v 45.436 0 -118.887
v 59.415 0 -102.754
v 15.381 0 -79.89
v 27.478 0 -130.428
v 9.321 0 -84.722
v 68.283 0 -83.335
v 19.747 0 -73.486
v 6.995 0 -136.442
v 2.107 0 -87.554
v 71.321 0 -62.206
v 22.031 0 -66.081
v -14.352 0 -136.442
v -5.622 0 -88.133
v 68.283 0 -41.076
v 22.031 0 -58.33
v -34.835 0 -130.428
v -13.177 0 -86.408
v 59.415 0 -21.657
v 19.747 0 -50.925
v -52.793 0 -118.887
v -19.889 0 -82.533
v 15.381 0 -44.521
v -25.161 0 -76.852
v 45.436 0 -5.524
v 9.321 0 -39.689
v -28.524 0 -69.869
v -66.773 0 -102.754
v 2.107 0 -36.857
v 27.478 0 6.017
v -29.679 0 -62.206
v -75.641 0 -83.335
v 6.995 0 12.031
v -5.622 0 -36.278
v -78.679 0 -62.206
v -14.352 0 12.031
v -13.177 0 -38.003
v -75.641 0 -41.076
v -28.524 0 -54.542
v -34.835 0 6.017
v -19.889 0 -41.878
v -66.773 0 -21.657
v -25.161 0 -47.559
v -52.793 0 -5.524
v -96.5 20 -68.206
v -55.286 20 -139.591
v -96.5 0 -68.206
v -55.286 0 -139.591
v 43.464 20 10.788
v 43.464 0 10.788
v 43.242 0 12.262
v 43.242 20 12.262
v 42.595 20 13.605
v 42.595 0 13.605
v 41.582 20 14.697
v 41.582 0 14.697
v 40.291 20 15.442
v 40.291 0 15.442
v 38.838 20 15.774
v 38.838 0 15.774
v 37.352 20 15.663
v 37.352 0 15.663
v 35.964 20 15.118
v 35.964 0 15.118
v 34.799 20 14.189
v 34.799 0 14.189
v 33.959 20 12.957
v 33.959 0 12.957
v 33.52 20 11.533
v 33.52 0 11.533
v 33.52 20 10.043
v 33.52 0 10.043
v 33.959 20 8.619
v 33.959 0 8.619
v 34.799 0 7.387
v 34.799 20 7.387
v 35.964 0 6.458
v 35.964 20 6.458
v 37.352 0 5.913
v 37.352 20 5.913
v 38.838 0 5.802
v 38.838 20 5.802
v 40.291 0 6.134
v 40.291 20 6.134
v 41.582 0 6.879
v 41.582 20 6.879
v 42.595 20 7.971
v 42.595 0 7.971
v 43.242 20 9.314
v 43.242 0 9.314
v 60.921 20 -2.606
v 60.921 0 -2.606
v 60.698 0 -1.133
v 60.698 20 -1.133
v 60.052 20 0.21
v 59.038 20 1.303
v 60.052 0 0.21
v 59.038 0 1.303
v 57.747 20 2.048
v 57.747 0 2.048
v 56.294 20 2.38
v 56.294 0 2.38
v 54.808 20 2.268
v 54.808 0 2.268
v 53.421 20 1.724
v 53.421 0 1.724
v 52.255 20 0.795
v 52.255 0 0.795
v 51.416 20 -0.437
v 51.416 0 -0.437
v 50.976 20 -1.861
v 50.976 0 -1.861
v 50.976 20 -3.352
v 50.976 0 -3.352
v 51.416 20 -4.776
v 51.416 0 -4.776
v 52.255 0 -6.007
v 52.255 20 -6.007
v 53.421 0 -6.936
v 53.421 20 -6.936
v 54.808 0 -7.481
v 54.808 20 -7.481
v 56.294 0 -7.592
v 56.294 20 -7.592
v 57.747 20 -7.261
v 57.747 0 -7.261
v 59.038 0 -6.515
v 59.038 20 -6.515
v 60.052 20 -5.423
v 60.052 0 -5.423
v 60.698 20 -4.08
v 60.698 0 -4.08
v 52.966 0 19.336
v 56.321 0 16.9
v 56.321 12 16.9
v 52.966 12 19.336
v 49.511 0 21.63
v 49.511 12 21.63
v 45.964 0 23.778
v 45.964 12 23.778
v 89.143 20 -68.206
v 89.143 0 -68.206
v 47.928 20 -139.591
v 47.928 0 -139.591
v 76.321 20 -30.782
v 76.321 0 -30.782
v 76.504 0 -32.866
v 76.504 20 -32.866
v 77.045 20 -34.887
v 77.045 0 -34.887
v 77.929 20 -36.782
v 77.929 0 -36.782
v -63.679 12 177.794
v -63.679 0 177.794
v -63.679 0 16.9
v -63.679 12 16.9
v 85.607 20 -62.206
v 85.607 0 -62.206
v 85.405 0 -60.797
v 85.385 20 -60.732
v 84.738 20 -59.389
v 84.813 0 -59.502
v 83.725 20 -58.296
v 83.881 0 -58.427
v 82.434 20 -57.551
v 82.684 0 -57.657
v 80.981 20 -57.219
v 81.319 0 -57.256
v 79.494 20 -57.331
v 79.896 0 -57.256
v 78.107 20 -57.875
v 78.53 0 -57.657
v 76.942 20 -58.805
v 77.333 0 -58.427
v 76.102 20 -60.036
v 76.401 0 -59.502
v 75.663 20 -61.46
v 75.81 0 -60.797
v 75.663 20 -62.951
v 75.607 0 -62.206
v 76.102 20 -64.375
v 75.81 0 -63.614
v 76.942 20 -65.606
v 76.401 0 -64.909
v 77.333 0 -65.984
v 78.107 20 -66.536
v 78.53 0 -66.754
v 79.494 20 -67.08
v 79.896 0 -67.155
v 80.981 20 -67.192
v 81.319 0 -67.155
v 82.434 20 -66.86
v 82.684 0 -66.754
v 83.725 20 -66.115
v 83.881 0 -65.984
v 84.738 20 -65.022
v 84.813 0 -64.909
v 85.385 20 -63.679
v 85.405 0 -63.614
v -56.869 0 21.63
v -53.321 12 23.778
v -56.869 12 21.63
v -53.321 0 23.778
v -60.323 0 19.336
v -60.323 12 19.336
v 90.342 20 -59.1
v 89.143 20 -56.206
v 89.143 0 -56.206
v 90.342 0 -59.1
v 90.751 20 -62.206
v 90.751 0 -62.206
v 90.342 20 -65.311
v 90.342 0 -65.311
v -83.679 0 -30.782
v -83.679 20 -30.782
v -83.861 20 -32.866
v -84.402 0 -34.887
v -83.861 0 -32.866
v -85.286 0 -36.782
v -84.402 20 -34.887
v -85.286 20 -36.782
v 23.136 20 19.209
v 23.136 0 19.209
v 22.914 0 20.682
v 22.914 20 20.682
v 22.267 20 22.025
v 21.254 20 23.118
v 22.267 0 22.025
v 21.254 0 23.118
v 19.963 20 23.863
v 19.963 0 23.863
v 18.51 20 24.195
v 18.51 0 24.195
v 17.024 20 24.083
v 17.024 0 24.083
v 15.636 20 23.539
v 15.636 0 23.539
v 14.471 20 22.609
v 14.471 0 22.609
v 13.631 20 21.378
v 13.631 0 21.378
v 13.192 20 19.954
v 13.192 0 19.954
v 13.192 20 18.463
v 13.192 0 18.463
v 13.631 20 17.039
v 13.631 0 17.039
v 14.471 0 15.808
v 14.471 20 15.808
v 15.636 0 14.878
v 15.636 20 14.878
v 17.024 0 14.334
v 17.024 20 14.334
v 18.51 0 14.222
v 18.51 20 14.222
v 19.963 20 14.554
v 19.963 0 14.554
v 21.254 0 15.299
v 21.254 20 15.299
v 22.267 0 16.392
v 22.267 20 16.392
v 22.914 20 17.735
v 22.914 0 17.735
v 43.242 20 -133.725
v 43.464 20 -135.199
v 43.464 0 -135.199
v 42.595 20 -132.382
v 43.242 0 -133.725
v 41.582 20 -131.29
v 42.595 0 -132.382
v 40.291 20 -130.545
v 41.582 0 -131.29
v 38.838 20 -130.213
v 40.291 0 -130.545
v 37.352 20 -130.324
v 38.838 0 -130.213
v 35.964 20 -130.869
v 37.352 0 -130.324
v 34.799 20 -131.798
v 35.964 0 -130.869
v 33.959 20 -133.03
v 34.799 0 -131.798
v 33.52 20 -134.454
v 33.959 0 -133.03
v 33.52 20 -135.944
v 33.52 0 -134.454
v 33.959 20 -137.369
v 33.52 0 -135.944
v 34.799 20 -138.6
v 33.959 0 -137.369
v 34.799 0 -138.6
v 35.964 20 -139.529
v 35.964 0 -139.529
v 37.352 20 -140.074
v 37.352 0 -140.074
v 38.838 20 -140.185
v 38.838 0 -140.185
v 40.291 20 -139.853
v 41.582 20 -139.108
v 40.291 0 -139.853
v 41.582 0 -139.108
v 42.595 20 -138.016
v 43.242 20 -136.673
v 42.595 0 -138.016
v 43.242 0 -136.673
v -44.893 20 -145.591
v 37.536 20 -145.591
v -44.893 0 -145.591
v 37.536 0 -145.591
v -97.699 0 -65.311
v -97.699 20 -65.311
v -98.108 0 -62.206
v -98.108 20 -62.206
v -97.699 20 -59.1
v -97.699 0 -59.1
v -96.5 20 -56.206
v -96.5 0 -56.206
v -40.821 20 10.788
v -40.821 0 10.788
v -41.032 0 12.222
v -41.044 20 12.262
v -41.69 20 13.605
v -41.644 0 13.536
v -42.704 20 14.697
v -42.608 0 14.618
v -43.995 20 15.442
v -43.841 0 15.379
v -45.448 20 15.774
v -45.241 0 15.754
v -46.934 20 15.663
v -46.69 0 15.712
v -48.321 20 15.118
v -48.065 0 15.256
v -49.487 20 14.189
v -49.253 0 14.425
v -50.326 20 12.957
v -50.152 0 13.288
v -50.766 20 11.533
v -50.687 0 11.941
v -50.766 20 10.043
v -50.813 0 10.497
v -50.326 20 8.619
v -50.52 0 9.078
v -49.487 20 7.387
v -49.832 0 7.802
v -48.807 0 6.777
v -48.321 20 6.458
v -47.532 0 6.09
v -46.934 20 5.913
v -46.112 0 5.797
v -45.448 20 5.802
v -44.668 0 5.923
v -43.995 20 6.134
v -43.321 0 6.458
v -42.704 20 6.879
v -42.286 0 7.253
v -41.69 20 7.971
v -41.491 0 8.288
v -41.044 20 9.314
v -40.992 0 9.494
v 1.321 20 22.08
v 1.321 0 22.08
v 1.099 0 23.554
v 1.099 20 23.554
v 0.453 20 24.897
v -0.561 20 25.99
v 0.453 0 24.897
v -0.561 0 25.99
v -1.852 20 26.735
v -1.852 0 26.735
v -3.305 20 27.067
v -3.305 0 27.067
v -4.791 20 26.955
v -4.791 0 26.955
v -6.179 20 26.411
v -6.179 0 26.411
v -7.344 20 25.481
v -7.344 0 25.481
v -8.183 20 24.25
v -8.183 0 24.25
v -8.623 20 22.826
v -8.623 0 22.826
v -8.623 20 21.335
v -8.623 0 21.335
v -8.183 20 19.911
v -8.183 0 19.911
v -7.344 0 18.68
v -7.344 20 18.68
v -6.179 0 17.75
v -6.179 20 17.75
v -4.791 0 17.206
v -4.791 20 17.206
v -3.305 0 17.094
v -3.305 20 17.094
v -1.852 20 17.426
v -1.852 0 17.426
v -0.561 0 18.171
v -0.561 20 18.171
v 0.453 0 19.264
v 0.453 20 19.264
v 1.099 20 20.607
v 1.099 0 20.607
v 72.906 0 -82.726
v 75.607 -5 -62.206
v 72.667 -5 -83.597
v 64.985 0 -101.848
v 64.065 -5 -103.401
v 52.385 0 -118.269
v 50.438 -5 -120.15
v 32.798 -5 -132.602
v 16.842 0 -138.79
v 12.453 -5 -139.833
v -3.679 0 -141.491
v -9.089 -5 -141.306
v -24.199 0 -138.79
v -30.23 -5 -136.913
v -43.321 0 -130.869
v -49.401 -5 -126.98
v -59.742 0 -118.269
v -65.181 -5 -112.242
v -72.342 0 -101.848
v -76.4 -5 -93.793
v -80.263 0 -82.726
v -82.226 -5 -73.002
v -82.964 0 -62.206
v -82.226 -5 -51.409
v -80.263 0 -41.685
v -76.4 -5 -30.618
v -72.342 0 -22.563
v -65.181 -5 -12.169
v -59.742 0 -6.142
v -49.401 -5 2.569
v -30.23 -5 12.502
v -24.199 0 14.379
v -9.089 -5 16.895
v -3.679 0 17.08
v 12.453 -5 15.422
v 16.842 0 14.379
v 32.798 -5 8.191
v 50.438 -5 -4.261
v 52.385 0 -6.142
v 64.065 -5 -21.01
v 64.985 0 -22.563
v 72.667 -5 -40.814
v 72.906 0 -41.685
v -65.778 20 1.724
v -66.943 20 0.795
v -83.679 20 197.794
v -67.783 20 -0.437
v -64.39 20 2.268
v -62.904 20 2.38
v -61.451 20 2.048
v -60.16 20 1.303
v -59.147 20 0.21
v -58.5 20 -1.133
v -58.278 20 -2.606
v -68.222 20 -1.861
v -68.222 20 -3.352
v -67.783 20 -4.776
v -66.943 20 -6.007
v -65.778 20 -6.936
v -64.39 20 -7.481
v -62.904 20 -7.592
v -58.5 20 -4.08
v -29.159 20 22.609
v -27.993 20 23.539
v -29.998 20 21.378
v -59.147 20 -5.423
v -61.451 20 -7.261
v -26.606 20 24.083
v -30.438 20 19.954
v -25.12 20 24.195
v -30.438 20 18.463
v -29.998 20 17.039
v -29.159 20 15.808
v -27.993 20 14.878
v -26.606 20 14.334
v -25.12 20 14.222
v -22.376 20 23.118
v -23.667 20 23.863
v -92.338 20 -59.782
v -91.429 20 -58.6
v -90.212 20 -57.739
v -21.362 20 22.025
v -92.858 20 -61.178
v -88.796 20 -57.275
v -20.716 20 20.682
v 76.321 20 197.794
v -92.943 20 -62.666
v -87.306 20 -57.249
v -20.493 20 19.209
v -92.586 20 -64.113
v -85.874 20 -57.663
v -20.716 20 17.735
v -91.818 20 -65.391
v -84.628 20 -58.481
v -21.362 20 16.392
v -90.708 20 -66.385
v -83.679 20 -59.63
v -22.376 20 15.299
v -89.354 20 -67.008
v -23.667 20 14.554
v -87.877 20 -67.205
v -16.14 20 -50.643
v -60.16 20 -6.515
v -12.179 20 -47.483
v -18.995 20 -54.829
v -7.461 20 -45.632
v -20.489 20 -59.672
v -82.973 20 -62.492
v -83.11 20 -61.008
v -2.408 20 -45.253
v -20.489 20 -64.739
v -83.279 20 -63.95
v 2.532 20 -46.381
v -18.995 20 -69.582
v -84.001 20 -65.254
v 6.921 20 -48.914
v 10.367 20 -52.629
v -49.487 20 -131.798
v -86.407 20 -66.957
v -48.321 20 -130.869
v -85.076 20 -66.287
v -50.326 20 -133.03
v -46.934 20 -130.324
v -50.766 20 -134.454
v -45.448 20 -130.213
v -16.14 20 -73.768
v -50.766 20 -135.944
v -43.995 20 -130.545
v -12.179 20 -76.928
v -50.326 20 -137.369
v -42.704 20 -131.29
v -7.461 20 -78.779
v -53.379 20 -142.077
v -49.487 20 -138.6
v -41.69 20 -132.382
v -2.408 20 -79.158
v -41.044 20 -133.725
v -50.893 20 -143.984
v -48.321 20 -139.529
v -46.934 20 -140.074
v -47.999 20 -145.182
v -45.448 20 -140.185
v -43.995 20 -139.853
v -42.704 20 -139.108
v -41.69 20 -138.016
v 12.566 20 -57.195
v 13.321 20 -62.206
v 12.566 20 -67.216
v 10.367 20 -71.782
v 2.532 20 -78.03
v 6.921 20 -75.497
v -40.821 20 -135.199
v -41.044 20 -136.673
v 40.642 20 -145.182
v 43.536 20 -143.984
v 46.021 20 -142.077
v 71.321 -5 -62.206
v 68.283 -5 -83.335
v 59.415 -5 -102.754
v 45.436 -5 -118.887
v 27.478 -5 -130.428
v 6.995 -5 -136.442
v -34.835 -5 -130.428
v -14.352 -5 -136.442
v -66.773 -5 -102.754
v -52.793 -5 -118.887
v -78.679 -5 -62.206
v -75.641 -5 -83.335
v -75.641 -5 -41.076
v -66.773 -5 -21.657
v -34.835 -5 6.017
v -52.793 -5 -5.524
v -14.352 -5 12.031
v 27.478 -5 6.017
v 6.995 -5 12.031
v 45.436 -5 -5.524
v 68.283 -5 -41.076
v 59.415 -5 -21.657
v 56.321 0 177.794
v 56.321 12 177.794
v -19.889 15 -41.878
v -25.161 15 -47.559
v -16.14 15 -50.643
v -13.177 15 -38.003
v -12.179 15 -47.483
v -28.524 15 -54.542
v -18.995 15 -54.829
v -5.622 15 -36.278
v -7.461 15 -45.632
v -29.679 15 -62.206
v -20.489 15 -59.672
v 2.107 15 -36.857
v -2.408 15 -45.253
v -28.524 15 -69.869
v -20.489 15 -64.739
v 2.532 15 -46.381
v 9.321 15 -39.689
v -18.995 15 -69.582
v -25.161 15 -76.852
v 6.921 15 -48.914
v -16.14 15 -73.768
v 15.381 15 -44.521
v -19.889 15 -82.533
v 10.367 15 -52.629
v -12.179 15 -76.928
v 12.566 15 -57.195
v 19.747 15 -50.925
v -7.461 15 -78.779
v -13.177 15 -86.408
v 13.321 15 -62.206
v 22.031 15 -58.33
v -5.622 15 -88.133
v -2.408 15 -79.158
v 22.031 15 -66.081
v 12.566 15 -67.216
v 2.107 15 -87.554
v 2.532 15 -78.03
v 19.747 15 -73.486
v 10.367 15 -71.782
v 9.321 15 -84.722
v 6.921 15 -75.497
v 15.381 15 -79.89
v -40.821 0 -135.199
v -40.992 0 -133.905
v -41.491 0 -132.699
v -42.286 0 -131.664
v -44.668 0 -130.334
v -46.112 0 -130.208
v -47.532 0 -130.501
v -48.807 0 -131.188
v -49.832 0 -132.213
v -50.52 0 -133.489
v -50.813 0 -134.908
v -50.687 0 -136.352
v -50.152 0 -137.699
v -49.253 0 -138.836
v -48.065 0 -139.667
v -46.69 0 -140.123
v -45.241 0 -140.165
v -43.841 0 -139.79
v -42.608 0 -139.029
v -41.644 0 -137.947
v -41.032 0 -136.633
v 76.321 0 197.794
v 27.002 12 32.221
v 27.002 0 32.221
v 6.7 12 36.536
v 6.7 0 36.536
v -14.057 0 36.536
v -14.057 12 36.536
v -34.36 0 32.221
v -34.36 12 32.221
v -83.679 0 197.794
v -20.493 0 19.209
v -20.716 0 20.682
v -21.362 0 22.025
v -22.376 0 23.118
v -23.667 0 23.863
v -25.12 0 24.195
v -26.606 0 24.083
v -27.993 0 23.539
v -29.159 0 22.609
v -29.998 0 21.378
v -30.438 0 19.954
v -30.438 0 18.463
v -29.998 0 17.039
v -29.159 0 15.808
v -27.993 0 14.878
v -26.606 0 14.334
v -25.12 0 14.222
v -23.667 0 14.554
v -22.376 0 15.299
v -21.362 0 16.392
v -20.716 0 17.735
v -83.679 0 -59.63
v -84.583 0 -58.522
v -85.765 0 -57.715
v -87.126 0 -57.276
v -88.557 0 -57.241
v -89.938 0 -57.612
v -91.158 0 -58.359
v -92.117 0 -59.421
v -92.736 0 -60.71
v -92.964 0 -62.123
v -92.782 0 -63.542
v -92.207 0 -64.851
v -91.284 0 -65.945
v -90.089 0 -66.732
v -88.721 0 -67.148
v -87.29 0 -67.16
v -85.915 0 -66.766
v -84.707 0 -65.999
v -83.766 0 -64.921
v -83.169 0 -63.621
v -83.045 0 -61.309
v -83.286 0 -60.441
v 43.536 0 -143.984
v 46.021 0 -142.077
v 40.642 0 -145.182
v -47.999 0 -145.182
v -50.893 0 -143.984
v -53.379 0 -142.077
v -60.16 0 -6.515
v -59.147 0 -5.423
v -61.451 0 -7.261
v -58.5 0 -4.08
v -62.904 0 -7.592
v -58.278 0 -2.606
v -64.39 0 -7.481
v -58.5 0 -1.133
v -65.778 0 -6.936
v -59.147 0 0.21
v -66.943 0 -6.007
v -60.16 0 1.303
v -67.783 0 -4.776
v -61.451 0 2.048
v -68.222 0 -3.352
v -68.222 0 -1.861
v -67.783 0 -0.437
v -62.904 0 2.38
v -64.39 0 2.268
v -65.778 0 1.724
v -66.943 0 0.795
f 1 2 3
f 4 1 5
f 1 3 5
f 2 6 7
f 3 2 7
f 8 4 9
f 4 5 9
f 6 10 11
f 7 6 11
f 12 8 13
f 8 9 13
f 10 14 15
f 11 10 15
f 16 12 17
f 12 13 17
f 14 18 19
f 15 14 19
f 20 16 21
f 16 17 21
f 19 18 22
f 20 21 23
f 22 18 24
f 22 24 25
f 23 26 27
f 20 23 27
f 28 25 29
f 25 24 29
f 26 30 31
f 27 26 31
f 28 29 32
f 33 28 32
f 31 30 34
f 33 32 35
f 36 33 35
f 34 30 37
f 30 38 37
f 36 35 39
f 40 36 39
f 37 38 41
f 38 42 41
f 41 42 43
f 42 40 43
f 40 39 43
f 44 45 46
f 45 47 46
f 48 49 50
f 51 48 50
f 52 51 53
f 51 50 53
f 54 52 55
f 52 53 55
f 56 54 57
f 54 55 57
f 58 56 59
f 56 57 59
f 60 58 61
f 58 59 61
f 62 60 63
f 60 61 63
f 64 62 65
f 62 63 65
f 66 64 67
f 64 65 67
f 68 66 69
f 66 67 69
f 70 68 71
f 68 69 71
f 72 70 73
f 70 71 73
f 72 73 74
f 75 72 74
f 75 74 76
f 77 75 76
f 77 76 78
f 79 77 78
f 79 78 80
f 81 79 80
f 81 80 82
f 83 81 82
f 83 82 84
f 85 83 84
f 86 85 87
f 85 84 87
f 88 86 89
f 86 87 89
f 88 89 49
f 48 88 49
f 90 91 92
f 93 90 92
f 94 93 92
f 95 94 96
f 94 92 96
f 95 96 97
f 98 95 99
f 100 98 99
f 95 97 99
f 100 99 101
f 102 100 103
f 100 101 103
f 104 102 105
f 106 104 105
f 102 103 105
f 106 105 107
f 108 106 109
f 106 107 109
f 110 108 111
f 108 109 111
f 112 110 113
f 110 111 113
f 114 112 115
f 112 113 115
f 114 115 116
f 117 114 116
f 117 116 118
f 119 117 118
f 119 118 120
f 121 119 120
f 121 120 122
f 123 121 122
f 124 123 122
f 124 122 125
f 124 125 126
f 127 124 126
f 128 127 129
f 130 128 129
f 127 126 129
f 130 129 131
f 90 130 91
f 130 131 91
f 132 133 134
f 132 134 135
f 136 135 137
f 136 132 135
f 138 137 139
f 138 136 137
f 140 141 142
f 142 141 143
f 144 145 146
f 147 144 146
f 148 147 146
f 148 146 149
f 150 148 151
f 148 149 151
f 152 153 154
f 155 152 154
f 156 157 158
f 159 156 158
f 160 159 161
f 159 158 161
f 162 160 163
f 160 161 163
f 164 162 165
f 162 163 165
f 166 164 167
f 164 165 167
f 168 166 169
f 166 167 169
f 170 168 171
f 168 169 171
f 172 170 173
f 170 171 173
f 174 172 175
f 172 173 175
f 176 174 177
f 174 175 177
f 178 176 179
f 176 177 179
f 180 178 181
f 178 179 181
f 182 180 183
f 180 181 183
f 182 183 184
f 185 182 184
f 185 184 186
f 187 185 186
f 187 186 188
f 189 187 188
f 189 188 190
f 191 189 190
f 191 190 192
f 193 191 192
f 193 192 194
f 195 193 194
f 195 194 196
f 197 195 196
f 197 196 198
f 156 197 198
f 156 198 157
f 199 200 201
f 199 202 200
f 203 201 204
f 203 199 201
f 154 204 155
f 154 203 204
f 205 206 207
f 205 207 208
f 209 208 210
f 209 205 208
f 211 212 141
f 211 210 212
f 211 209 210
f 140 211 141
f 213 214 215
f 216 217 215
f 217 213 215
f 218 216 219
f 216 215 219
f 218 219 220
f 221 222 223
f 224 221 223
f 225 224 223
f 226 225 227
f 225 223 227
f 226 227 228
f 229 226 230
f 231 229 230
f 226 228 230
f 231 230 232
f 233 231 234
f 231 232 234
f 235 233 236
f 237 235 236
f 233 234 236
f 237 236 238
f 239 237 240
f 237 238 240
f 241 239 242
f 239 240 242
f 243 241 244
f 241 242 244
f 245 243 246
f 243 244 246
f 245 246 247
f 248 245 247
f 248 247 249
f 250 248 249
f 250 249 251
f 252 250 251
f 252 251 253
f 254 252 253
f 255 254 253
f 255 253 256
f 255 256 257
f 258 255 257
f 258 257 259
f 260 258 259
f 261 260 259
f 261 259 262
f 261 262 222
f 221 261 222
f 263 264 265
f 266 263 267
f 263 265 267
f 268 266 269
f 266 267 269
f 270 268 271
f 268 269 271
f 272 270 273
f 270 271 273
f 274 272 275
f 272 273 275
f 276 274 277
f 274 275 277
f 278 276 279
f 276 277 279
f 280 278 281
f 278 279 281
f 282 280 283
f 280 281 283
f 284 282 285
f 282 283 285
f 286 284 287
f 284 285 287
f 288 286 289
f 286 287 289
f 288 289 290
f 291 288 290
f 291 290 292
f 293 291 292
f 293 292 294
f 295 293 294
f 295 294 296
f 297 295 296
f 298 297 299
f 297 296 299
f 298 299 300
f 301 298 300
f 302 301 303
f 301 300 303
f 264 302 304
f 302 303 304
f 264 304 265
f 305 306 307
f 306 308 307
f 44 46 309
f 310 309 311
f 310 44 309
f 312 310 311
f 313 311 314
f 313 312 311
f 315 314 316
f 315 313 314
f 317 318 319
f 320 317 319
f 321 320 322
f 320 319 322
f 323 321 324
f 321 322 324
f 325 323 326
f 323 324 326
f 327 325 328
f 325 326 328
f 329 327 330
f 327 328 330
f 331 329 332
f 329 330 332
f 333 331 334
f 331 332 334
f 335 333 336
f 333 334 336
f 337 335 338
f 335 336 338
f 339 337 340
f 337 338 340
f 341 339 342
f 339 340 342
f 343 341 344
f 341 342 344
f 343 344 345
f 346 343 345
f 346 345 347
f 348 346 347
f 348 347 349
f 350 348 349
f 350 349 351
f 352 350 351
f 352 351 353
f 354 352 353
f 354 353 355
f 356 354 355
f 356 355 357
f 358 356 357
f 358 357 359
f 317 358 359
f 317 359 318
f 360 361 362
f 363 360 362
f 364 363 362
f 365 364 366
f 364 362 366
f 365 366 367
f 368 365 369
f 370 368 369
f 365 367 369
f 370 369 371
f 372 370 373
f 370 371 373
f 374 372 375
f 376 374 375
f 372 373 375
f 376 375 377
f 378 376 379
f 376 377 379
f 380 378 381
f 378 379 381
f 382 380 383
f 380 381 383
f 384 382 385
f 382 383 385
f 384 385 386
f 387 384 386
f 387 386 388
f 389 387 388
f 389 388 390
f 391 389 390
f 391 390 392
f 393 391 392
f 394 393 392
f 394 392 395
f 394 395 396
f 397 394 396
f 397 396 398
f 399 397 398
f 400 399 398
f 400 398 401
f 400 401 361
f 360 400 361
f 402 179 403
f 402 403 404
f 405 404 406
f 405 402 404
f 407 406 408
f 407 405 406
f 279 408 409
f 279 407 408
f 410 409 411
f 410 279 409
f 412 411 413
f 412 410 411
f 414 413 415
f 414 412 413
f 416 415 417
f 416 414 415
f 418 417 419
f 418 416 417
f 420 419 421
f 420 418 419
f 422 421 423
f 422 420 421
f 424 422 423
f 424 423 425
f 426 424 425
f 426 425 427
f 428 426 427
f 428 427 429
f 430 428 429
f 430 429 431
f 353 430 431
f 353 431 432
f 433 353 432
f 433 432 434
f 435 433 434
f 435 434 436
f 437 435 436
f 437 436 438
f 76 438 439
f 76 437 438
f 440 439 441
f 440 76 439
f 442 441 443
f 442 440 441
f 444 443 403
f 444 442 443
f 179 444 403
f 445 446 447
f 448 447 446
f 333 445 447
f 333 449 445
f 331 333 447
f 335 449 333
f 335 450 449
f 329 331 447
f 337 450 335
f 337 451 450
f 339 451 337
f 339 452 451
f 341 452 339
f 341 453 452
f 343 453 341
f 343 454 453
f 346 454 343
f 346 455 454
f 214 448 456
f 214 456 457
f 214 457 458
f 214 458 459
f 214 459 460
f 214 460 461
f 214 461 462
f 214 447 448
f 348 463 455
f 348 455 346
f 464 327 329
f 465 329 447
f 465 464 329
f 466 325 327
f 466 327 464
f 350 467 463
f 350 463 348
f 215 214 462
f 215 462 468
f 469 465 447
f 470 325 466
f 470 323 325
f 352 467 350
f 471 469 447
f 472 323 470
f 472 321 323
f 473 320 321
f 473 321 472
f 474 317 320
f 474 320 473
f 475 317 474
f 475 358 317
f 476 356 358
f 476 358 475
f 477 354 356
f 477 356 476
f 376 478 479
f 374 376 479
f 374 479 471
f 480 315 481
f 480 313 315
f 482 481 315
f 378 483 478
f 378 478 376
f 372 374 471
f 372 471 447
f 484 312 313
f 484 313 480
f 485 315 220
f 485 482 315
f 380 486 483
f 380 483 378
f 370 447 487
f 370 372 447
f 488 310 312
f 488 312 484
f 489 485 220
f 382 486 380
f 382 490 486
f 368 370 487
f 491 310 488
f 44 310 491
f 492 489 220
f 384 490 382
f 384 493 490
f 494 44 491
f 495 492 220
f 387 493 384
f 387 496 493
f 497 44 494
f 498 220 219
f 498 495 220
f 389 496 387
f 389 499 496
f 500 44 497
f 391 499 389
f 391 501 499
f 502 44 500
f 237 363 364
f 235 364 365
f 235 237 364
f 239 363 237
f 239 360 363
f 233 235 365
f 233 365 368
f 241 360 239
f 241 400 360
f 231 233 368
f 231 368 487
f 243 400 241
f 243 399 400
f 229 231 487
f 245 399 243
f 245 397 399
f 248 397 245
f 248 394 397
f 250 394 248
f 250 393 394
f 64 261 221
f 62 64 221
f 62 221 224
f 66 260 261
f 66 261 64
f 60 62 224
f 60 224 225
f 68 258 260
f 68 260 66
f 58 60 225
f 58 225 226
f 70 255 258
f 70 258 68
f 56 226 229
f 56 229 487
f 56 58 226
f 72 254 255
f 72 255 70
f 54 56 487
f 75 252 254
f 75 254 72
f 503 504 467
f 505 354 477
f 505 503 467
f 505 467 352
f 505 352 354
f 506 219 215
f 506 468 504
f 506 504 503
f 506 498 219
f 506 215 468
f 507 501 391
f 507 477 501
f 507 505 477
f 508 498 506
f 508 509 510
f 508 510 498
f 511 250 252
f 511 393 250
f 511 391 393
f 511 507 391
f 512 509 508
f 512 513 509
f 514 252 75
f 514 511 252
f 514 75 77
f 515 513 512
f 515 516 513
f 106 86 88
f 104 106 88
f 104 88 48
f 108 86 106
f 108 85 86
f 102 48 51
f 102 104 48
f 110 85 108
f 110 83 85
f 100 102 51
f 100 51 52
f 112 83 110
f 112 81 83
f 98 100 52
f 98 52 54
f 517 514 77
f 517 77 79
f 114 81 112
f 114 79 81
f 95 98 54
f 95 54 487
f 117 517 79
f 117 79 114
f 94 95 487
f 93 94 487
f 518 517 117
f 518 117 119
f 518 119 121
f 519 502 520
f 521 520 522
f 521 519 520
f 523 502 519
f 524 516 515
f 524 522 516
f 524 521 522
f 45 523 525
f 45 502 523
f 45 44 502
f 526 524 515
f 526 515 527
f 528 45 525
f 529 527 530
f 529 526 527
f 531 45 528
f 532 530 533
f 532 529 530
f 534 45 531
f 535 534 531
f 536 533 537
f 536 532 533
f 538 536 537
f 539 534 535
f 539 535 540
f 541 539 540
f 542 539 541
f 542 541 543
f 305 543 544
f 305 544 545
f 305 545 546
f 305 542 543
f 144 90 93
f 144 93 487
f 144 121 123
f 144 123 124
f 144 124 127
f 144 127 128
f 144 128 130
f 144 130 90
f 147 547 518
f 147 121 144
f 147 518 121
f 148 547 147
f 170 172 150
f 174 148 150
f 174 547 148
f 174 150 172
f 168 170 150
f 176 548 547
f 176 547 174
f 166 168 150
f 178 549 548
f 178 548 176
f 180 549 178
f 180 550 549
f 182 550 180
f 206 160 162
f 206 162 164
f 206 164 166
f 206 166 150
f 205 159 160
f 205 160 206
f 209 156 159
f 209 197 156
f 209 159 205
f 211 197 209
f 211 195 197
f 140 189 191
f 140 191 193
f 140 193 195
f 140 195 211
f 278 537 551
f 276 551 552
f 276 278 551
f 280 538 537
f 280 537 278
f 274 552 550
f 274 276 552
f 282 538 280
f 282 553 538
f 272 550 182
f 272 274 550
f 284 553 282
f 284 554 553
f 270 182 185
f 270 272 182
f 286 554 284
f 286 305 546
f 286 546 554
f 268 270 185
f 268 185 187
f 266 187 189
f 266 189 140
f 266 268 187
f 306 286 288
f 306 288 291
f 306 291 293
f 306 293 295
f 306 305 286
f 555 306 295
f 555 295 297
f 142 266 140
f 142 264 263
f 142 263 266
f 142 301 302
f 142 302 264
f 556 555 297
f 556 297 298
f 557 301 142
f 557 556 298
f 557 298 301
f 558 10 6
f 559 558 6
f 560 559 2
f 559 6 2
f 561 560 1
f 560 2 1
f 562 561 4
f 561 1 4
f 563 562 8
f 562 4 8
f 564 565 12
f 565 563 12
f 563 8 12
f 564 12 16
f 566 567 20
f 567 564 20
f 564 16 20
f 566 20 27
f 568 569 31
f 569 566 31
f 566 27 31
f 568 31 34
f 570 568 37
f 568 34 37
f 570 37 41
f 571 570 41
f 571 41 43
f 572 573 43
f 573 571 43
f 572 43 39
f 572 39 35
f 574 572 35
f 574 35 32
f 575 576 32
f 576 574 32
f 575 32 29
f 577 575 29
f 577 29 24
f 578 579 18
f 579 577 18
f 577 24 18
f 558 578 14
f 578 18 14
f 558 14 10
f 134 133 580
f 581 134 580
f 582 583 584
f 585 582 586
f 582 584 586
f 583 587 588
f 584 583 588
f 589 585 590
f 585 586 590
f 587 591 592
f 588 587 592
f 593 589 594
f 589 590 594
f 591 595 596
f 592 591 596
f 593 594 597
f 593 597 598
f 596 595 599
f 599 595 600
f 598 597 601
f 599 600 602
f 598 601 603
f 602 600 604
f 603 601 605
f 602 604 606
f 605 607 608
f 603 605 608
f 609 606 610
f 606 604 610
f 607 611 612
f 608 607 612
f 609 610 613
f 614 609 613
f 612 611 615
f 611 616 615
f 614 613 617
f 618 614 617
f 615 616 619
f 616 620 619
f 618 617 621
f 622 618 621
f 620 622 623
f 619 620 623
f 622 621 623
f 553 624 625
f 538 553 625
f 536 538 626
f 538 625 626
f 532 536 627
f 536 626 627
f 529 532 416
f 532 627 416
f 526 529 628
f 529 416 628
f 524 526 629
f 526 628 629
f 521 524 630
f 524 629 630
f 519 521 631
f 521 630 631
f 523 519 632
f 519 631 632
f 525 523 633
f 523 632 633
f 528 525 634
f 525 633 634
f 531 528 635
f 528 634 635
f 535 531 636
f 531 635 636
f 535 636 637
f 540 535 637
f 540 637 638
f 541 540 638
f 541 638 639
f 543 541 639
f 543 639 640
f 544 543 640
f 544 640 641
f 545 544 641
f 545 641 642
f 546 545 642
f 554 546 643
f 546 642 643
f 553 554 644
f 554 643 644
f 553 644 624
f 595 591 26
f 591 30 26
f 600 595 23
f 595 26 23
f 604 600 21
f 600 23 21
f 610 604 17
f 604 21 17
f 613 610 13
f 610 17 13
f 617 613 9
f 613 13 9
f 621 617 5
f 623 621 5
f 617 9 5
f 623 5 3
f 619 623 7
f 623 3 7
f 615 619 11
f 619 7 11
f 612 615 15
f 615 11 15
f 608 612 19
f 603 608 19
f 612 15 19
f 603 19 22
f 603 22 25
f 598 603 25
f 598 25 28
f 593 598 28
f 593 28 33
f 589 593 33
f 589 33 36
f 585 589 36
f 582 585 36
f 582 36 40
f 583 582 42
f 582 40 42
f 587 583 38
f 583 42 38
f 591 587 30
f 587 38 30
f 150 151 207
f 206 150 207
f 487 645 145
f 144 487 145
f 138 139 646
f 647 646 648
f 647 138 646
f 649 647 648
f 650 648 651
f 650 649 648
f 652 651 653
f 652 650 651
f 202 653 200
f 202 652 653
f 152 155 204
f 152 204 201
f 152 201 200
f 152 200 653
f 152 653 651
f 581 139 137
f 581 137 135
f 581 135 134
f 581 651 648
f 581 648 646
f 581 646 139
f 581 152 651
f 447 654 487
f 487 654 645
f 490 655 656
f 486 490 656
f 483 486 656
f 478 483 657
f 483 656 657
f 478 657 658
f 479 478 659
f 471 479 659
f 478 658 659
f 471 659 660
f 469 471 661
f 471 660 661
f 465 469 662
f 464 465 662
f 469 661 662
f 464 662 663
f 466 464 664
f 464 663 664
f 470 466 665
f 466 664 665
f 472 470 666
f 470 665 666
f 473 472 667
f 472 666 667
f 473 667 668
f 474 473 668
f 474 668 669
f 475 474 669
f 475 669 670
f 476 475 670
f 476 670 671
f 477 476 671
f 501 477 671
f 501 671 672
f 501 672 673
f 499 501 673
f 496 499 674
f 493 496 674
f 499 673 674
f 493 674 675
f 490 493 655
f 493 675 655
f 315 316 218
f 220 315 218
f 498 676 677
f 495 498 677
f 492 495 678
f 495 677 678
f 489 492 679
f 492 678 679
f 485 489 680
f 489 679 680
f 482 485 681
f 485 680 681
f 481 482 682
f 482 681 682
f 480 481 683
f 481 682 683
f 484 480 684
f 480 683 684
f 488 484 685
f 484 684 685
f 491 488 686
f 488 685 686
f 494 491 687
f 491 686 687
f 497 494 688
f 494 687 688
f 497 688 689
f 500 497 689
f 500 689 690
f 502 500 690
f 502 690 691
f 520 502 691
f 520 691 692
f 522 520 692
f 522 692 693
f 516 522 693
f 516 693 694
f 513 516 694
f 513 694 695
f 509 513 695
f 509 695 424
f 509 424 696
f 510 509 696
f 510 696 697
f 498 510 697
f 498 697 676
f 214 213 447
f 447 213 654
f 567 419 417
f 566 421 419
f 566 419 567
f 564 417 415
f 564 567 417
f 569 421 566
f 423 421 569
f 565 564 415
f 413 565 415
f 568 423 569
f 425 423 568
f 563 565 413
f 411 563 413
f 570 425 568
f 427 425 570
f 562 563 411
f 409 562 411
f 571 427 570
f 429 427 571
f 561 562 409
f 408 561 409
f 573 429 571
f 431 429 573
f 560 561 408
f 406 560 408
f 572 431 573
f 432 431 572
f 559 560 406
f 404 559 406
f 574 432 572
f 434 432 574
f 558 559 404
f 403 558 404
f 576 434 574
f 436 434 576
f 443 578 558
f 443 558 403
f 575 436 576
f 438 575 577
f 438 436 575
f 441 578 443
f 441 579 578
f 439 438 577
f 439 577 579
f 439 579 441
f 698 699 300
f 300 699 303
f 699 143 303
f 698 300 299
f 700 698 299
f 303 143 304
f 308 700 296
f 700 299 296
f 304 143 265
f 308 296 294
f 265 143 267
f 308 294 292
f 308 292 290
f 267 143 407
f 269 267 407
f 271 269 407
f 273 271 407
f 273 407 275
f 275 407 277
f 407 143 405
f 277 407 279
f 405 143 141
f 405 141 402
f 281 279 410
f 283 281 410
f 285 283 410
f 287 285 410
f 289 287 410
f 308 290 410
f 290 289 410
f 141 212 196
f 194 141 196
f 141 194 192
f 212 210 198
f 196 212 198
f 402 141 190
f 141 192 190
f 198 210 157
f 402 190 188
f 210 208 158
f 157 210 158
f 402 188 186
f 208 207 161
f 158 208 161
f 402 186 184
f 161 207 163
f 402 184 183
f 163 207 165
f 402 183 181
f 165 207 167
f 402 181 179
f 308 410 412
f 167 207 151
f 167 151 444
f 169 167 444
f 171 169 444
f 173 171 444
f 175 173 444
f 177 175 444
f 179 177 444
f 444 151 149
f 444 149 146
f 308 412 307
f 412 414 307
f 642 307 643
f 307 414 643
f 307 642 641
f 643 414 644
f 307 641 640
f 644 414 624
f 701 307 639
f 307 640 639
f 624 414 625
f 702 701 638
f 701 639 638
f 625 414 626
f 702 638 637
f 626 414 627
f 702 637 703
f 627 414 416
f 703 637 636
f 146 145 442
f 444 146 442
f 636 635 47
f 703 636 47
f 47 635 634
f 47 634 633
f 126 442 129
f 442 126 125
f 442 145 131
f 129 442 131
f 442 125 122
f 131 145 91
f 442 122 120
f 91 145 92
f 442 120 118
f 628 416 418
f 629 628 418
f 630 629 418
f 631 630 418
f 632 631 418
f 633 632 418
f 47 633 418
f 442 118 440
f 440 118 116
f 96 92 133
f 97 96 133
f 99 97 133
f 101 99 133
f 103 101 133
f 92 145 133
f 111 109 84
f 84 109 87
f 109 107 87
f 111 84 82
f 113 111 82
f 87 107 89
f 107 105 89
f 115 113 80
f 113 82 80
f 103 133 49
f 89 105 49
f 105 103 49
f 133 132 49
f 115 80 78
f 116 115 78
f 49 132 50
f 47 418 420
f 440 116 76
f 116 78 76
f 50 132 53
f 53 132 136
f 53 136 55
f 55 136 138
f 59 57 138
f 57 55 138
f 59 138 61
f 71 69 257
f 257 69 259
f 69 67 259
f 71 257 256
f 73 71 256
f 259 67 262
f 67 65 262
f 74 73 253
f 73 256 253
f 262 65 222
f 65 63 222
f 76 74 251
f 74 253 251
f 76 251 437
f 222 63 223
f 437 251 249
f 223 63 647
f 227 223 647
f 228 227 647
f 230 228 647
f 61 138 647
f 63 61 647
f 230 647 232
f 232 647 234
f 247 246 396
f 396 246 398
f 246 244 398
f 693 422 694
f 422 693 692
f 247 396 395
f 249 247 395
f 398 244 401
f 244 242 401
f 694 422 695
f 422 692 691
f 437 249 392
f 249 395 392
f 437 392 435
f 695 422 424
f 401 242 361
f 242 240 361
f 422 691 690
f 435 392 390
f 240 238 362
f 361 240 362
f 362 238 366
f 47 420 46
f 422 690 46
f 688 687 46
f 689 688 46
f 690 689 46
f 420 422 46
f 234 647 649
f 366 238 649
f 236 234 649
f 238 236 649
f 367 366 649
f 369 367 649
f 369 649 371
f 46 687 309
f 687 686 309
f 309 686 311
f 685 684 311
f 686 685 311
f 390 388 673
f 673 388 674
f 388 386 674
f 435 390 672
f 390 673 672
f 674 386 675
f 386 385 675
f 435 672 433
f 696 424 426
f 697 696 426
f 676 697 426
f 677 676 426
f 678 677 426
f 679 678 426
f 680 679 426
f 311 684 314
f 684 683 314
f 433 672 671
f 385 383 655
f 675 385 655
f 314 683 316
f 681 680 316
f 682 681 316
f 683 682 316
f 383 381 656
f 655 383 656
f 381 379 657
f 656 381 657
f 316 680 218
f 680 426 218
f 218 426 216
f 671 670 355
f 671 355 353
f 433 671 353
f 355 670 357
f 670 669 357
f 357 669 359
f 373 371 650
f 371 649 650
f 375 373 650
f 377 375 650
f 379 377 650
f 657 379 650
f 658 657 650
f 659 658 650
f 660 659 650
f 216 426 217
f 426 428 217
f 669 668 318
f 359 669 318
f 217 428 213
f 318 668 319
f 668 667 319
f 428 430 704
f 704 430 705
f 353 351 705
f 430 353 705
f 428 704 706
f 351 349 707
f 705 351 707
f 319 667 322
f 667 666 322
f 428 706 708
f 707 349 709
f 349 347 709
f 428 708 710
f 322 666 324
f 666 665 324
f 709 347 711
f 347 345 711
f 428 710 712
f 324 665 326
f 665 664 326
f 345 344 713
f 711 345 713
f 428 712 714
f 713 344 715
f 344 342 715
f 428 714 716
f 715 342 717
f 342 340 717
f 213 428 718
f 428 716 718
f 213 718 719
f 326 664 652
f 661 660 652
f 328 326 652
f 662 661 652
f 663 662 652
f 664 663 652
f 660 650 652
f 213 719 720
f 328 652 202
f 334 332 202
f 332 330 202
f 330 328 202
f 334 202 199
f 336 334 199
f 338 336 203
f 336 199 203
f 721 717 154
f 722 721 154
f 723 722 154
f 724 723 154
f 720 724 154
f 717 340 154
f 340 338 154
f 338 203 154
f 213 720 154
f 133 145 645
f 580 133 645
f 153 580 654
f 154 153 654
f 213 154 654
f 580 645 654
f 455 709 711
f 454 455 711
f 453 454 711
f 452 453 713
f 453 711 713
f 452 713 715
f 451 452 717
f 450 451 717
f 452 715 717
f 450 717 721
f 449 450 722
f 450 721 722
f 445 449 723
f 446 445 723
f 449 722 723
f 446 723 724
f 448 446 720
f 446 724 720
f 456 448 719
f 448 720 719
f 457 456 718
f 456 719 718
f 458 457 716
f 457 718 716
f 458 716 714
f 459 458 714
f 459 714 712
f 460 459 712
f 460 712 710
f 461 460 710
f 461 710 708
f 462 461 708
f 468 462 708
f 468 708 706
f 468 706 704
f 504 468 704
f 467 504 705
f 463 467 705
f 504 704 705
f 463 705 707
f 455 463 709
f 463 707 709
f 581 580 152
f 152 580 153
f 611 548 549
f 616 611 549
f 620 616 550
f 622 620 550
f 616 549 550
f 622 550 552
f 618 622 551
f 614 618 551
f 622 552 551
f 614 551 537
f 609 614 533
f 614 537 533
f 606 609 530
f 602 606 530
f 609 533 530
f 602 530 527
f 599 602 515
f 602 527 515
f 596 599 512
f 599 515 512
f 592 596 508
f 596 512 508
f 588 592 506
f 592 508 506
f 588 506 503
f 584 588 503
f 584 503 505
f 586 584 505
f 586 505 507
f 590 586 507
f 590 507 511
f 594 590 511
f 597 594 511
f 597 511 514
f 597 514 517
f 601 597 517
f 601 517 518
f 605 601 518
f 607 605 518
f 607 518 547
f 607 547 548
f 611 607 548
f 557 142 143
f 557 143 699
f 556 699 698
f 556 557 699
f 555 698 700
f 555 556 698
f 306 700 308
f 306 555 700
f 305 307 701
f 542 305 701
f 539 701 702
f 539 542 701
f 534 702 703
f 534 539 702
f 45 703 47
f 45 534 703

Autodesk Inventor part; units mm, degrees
ref_plane "YZ Plane" through (0, 0, 0) normal (1, 0, 0) x (0, 1, 0)
ref_plane "XZ Plane" through (0, 0, 0) normal (0, 1, 0) x (-1, 0, 0)
ref_plane "XY Plane" through (0, 0, 0) normal (0, 0, 1) x (1, 0, 0)
sketch "Sketch1" plane through (0, 0, 0) normal (0, 1, 0) x (-1, 0, 0)
  line L0 (83.678612, 197.794487) -> (-76.321388, 197.794487)
  line L1 (-76.321388, 197.794487) -> (-76.321388, -52.205513)
  line L2 (-76.321388, -52.205513) -> (83.678612, -52.205513)
  line L3 (83.678612, -52.205513) -> (83.678612, 197.794487)
  circle A0 centre (3.678612, -62.205513) radius 80
  line L4 (83.678612, -52.205513) -> (83.678612, -62.205513)
  line L5 (-76.321388, -52.205513) -> (-76.321388, -62.205513)
  circle A1 centre (3.678612, -62.205513) radius 26
  circle A2 centre (3.678612, -62.205513) radius 40
  point P0 (0, 0)
  point P1 (59.392898, -23.634084)
  point P2 (-75.693927, -52.205513)
  point P3 (83.051152, -52.205513)
  dimension "d0" = 250
  dimension "d1" = 160
  dimension "d2" = 160
  dimension "d3" = 10
  dimension "d4" = 52
  dimension "d5" = 80
extrude "Extrusion1" add sketch "Sketch1" along normal blind 20 contours L3 L2 A0 L1 L0 | L4 A0 L2 | L2 A0 L5 | A0 L2 A2 | L2 A2 A0 | A2 L2 A1 | L2 A1 A2
sketch "Sketch2" plane through (0, 20, 0) normal (0, 1, 0) x (1, 0, 0)
  circle A0 centre (-3.678612, 62.205513) radius 26
  circle A1 centre (-3.678612, 62.205513) radius 26
  circle A2 centre (-3.678612, 62.205513) radius 17
  point P0 (0, 0)
  dimension "d8" = 34
extrude "Extrusion2" add sketch "Sketch2" against normal blind 5
sketch "Sketch3" plane through (0, 0, 0) normal (0, -1, 0) x (1, 0, 0)
  circle A0 centre (-3.678612, -62.205513) radius 75
  circle A1 centre (-3.678612, -62.205513) radius 75
  line L0 (92.607102, -62.205513) -> (44.464245, -145.591387)
  line L1 (44.464245, -145.591387) -> (-51.821469, -145.591387)
  line L2 (-51.821469, -145.591387) -> (-99.964327, -62.205513)
  line L3 (-99.964327, -62.205513) -> (-51.821469, 21.180362)
  line L4 (-51.821469, 21.180362) -> (44.464245, 21.180362)
  line L5 (44.464245, 21.180362) -> (92.607102, -62.205513)
  line L6 (80.607102, -62.205513) -> (38.464245, -135.199083)
  line L7 (38.464245, -135.199083) -> (-45.821469, -135.199083)
  line L8 (-45.821469, -135.199083) -> (-87.964327, -62.205513)
  line L9 (-87.964327, -62.205513) -> (-45.821469, 10.788057)
  line L10 (-45.821469, 10.788057) -> (38.464245, 10.788057)
  line L11 (38.464245, 10.788057) -> (80.607102, -62.205513)
  circle A2 centre (80.607102, -62.205513) radius 5
  circle A3 centre (38.464245, 10.788057) radius 5
  circle A4 centre (-45.821469, 10.788057) radius 5
  circle A5 centre (-87.964327, -62.205513) radius 5
  circle A6 centre (-45.821469, -135.199083) radius 5
  circle A7 centre (38.464245, -135.199083) radius 5
  circle A8 centre (-3.678612, -62.205513) radius 26
  circle A9 centre (-3.678612, -62.205513) radius 0.853538
  point P0 (0, 0)
  point P1 (-59.392898, -100.776941)
  point P2 (-3.678612, -62.205513)
  dimension "d13" = 360
sketch "Sketch4" plane through (0, 0, 0) normal (0, -1, 0) x (1, 0, 0)
  circle A0 centre (-45.821469, -135.199083) radius 5
  line L0 (-45.821469, -135.199083) -> (-87.964327, -62.205513)
  line L1 (-51.821469, -145.591387) -> (-99.964327, -62.205513)
  circle A1 centre (-87.964327, -62.205513) radius 5
  circle A2 centre (-45.821469, 10.788057) radius 5
  line L2 (-87.964327, -62.205513) -> (-45.821469, 10.788057)
  line L3 (-99.964327, -62.205513) -> (-51.821469, 21.180362)
  line L4 (38.464245, -135.199083) -> (-45.821469, -135.199083)
  circle A3 centre (38.464245, -135.199083) radius 5
  line L5 (44.464245, -145.591387) -> (-51.821469, -145.591387)
  line L6 (80.607102, -62.205513) -> (38.464245, -135.199083)
  line L7 (92.607102, -62.205513) -> (44.464245, -145.591387)
  circle A4 centre (-3.678612, -62.205513) radius 75
  circle A5 centre (-3.678612, -62.205513) radius 75
  line L8 (-45.821469, 10.788057) -> (38.464245, 10.788057)
  line L9 (-51.821469, 21.180362) -> (44.464245, 21.180362)
  circle A6 centre (80.607102, -62.205513) radius 5
  circle A7 centre (38.464245, 10.788057) radius 5
  line L10 (38.464245, 10.788057) -> (80.607102, -62.205513)
  line L11 (44.464245, 21.180362) -> (92.607102, -62.205513)
  circle A8 centre (-3.678612, -62.205513) radius 26
  circle A9 centre (-3.678612, -62.205513) radius 17
  circle A10 centre (-3.678612, -62.205513) radius 2.321388
  point P0 (0, 0)
  point P1 (0, 0)
  point P2 (-59.392898, -100.776941)
  dimension "d18" = 360
extrude "Extrusion3" cut sketch "Sketch3" against normal blind 22 contours A2 L6 L11 | L11 L6 A2 | A3 L10 L11 | L11 L10 A3 | A7 L7 L6 | L6 L7 A7 | A4 L9 L10 | L10 L9 A4 | A6 L8 L7 | L7 L8 A6 | A5 L8 L9 | L9 L8 A5
extrude "Extrusion4" add sketch "Sketch4" against normal blind 20 contours A0 L0 A4 L4 | A4 L6 A3 L4 | L0 A1 L2 A4 | A4 L10 A6 L6 | L2 A2 L8 A4 | L8 A7 L10 A4 | L1 L3 L9 L11 L7 L5
sketch "Sketch5" plane through (0, 0, 0) normal (0, -1, 0) x (1, 0, 0)
  circle A0 centre (-3.678612, -62.205513) radius 17
  circle A1 centre (-3.678612, -62.205513) radius 79.285714
  circle A2 centre (80.607102, -62.205513) radius 5
  circle A3 centre (-3.678612, -62.205513) radius 75
  point P0 (0, 0)
  dimension "d21" = 150
extrude "Extrusion5" add sketch "Sketch5" along normal blind 5 contours A1
fillet "Fillet1" radius 12 6 edges at (-83.6786, 10, -33.9978) (-99.9643, 10, -62.2055) (-51.8215, 10, -145.5914) (44.4642, 10, -145.5914) (92.6071, 10, -62.2055) (76.3214, 10, -33.9978)
sketch "Sketch6" plane through (0, 0, 0) normal (0, -1, 0) x (1, 0, 0)
  arc A0 (89.143, -68.205513) -> (89.143, -56.205513) centre (78.750696, -62.205513) ccw
  line L0 (89.143, -56.205513) -> (77.929083, -36.782438)
  arc A1 (76.321388, -30.782438) -> (77.929083, -36.782438) centre (88.321388, -30.782438) ccw
  line L1 (76.321388, 197.794487) -> (76.321388, -30.782438)
  line L2 (-83.678612, 197.794487) -> (76.321388, 197.794487)
  line L3 (-83.678612, -30.782438) -> (-83.678612, 197.794487)
  arc A2 (-85.286307, -36.782438) -> (-83.678612, -30.782438) centre (-95.678612, -30.782438) ccw
  line L4 (-85.286307, -36.782438) -> (-96.500225, -56.205513)
  arc A3 (-96.500225, -56.205513) -> (-96.500225, -68.205513) centre (-86.10792, -62.205513) ccw
  line L5 (-96.500225, -68.205513) -> (-55.285571, -139.591387)
  arc A4 (-55.285571, -139.591387) -> (-44.893266, -145.591387) centre (-44.893266, -133.591387) ccw
  line L6 (-44.893266, -145.591387) -> (37.536042, -145.591387)
  arc A5 (37.536042, -145.591387) -> (47.928346, -139.591387) centre (37.536042, -133.591387) ccw
  line L7 (47.928346, -139.591387) -> (89.143, -68.205513)
  circle A6 centre (-87.964327, -62.205513) radius 5
  arc A7 (-43.321469, 6.45793) -> (-82.964327, -62.205513) centre (-3.678612, -62.205513) ccw
  circle A8 centre (-45.821469, 10.788057) radius 5
  arc A9 (35.964245, 6.45793) -> (-43.321469, 6.45793) centre (-3.678612, -62.205513) ccw
  circle A10 centre (38.464245, 10.788057) radius 5
  arc A11 (75.607102, -62.205513) -> (35.964245, 6.45793) centre (-3.678612, -62.205513) ccw
  circle A12 centre (80.607102, -62.205513) radius 5
  arc A13 (35.964245, -130.868956) -> (75.607102, -62.205513) centre (-3.678612, -62.205513) ccw
  circle A14 centre (38.464245, -135.199083) radius 5
  arc A15 (-43.321469, -130.868956) -> (35.964245, -130.868956) centre (-3.678612, -62.205513) ccw
  circle A16 centre (-45.821469, -135.199083) radius 5
  arc A17 (-82.964327, -62.205513) -> (-43.321469, -130.868956) centre (-3.678612, -62.205513) ccw
  arc A18 (56.321388, -30.782438) -> (60.608575, -46.782438) centre (88.321388, -30.782438) ccw
  line L8 (60.608575, -46.782438) -> (69.513091, -62.205513)
  line L9 (69.513091, -62.205513) -> (32.917239, -125.591387)
  line L10 (32.917239, -125.591387) -> (-40.274464, -125.591387)
  line L11 (-40.274464, -125.591387) -> (-76.870316, -62.205513)
  line L12 (-76.870316, -62.205513) -> (-67.965799, -46.782438)
  arc A19 (-67.965799, -46.782438) -> (-63.678612, -30.782438) centre (-95.678612, -30.782438) ccw
  line L13 (-63.678612, -30.782438) -> (-63.678612, 177.794487)
  line L14 (-63.678612, 177.794487) -> (56.321388, 177.794487)
  line L15 (56.321388, 177.794487) -> (56.321388, -30.782438)
  arc A20 (-53.321469, 23.778438) -> (-102.964327, -62.205513) centre (-3.678612, -62.205513) ccw
  arc A21 (-102.964327, -62.205513) -> (-53.321469, -148.189464) centre (-3.678612, -62.205513) ccw
  arc A22 (-53.321469, -148.189464) -> (45.964245, -148.189464) centre (-3.678612, -62.205513) ccw
  arc A23 (45.964245, -148.189464) -> (95.607102, -62.205513) centre (-3.678612, -62.205513) ccw
  arc A24 (95.607102, -62.205513) -> (45.964245, 23.778438) centre (-3.678612, -62.205513) ccw
  arc A25 (45.964245, 23.778438) -> (-53.321469, 23.778438) centre (-3.678612, -62.205513) ccw
  point P0 (0, 0)
  point P1 (-63.678612, 16.899816)
  point P2 (56.321388, 16.899816)
  dimension "d25" = 20
  dimension "d26" = 20
sketch "Sketch6 outline for Extrusion6" plane through (0, 0, 0) normal (0, -1, 0) x (1, 0, 0)
  line L0 (56.321388, 177.794487) -> (-63.678612, 177.794487)
  line L1 (56.321388, 16.899816) -> (56.321388, 177.794487)
  arc A0 (45.964245, 23.778438) -> (56.321388, 16.899816) centre (-3.678612, -62.205513) cw
  arc A1 (-53.321469, 23.778438) -> (45.964245, 23.778438) centre (-3.678612, -62.205513) cw
  arc A2 (-63.678612, 16.899816) -> (-53.321469, 23.778438) centre (-3.678612, -62.205513) cw
  line L2 (-63.678612, 177.794487) -> (-63.678612, 16.899816)
extrude "Extrusion6" cut sketch "Sketch6 outline for Extrusion6" against normal blind 12
sketch "Sketch7" plane through (0, 0, 0) normal (0, -1, 0) x (1, 0, 0)
  circle A0 centre (-3.678612, 22.080487) radius 5
  circle A1 centre (-3.678612, -62.205513) radius 17
  circle A2 centre (-25.493434, 19.208511) radius 5
  circle A3 centre (-45.821612, 10.788304) radius 5
  circle A4 centre (-63.277814, -2.606311) radius 5
  circle A5 centre (-76.672429, -20.062513) radius 5
  circle A6 centre (-85.092637, -40.390691) radius 5
  circle A7 centre (-87.964612, -62.205513) radius 5
  circle A8 centre (-85.092637, -84.020335) radius 5
  circle A9 centre (-76.672429, -104.348513) radius 5
  circle A10 centre (-63.277814, -121.804715) radius 5
  circle A11 centre (-45.821612, -135.19933) radius 5
  circle A12 centre (-25.493434, -143.619537) radius 5
  circle A13 centre (-3.678612, -146.491513) radius 5
  circle A14 centre (18.13621, -143.619537) radius 5
  circle A15 centre (38.464388, -135.19933) radius 5
  circle A16 centre (55.92059, -121.804715) radius 5
  circle A17 centre (69.315205, -104.348513) radius 5
  circle A18 centre (77.735412, -84.020335) radius 5
  circle A19 centre (80.607388, -62.205513) radius 5
  circle A20 centre (77.735412, -40.390691) radius 5
  circle A21 centre (69.315205, -20.062513) radius 5
  circle A22 centre (55.92059, -2.606311) radius 5
  circle A23 centre (38.464388, 10.788304) radius 5
  circle A24 centre (18.13621, 19.208511) radius 5
  point P0 (0, 0)
  dimension "d29" = 84.286
  dimension "d30" = 10
  dimension "d33" = 360
extrude "Extrusion7" cut sketch "Sketch7" against normal blind 39 contours A0 | A2 | A4 | A5 | A21 | A22 | A24
sketch "Sketch8" plane through (0, 20, 0) normal (0, 1, 0) x (1, 0, 0)
  circle A0 centre (69.315205, 20.062513) radius 5
  circle A1 centre (-76.672429, 20.062513) radius 5
  point P0 (0, 0)
extrude "Extrusion8" add sketch "Sketch8" against normal blind 20
properties part number "ZadKriska"
